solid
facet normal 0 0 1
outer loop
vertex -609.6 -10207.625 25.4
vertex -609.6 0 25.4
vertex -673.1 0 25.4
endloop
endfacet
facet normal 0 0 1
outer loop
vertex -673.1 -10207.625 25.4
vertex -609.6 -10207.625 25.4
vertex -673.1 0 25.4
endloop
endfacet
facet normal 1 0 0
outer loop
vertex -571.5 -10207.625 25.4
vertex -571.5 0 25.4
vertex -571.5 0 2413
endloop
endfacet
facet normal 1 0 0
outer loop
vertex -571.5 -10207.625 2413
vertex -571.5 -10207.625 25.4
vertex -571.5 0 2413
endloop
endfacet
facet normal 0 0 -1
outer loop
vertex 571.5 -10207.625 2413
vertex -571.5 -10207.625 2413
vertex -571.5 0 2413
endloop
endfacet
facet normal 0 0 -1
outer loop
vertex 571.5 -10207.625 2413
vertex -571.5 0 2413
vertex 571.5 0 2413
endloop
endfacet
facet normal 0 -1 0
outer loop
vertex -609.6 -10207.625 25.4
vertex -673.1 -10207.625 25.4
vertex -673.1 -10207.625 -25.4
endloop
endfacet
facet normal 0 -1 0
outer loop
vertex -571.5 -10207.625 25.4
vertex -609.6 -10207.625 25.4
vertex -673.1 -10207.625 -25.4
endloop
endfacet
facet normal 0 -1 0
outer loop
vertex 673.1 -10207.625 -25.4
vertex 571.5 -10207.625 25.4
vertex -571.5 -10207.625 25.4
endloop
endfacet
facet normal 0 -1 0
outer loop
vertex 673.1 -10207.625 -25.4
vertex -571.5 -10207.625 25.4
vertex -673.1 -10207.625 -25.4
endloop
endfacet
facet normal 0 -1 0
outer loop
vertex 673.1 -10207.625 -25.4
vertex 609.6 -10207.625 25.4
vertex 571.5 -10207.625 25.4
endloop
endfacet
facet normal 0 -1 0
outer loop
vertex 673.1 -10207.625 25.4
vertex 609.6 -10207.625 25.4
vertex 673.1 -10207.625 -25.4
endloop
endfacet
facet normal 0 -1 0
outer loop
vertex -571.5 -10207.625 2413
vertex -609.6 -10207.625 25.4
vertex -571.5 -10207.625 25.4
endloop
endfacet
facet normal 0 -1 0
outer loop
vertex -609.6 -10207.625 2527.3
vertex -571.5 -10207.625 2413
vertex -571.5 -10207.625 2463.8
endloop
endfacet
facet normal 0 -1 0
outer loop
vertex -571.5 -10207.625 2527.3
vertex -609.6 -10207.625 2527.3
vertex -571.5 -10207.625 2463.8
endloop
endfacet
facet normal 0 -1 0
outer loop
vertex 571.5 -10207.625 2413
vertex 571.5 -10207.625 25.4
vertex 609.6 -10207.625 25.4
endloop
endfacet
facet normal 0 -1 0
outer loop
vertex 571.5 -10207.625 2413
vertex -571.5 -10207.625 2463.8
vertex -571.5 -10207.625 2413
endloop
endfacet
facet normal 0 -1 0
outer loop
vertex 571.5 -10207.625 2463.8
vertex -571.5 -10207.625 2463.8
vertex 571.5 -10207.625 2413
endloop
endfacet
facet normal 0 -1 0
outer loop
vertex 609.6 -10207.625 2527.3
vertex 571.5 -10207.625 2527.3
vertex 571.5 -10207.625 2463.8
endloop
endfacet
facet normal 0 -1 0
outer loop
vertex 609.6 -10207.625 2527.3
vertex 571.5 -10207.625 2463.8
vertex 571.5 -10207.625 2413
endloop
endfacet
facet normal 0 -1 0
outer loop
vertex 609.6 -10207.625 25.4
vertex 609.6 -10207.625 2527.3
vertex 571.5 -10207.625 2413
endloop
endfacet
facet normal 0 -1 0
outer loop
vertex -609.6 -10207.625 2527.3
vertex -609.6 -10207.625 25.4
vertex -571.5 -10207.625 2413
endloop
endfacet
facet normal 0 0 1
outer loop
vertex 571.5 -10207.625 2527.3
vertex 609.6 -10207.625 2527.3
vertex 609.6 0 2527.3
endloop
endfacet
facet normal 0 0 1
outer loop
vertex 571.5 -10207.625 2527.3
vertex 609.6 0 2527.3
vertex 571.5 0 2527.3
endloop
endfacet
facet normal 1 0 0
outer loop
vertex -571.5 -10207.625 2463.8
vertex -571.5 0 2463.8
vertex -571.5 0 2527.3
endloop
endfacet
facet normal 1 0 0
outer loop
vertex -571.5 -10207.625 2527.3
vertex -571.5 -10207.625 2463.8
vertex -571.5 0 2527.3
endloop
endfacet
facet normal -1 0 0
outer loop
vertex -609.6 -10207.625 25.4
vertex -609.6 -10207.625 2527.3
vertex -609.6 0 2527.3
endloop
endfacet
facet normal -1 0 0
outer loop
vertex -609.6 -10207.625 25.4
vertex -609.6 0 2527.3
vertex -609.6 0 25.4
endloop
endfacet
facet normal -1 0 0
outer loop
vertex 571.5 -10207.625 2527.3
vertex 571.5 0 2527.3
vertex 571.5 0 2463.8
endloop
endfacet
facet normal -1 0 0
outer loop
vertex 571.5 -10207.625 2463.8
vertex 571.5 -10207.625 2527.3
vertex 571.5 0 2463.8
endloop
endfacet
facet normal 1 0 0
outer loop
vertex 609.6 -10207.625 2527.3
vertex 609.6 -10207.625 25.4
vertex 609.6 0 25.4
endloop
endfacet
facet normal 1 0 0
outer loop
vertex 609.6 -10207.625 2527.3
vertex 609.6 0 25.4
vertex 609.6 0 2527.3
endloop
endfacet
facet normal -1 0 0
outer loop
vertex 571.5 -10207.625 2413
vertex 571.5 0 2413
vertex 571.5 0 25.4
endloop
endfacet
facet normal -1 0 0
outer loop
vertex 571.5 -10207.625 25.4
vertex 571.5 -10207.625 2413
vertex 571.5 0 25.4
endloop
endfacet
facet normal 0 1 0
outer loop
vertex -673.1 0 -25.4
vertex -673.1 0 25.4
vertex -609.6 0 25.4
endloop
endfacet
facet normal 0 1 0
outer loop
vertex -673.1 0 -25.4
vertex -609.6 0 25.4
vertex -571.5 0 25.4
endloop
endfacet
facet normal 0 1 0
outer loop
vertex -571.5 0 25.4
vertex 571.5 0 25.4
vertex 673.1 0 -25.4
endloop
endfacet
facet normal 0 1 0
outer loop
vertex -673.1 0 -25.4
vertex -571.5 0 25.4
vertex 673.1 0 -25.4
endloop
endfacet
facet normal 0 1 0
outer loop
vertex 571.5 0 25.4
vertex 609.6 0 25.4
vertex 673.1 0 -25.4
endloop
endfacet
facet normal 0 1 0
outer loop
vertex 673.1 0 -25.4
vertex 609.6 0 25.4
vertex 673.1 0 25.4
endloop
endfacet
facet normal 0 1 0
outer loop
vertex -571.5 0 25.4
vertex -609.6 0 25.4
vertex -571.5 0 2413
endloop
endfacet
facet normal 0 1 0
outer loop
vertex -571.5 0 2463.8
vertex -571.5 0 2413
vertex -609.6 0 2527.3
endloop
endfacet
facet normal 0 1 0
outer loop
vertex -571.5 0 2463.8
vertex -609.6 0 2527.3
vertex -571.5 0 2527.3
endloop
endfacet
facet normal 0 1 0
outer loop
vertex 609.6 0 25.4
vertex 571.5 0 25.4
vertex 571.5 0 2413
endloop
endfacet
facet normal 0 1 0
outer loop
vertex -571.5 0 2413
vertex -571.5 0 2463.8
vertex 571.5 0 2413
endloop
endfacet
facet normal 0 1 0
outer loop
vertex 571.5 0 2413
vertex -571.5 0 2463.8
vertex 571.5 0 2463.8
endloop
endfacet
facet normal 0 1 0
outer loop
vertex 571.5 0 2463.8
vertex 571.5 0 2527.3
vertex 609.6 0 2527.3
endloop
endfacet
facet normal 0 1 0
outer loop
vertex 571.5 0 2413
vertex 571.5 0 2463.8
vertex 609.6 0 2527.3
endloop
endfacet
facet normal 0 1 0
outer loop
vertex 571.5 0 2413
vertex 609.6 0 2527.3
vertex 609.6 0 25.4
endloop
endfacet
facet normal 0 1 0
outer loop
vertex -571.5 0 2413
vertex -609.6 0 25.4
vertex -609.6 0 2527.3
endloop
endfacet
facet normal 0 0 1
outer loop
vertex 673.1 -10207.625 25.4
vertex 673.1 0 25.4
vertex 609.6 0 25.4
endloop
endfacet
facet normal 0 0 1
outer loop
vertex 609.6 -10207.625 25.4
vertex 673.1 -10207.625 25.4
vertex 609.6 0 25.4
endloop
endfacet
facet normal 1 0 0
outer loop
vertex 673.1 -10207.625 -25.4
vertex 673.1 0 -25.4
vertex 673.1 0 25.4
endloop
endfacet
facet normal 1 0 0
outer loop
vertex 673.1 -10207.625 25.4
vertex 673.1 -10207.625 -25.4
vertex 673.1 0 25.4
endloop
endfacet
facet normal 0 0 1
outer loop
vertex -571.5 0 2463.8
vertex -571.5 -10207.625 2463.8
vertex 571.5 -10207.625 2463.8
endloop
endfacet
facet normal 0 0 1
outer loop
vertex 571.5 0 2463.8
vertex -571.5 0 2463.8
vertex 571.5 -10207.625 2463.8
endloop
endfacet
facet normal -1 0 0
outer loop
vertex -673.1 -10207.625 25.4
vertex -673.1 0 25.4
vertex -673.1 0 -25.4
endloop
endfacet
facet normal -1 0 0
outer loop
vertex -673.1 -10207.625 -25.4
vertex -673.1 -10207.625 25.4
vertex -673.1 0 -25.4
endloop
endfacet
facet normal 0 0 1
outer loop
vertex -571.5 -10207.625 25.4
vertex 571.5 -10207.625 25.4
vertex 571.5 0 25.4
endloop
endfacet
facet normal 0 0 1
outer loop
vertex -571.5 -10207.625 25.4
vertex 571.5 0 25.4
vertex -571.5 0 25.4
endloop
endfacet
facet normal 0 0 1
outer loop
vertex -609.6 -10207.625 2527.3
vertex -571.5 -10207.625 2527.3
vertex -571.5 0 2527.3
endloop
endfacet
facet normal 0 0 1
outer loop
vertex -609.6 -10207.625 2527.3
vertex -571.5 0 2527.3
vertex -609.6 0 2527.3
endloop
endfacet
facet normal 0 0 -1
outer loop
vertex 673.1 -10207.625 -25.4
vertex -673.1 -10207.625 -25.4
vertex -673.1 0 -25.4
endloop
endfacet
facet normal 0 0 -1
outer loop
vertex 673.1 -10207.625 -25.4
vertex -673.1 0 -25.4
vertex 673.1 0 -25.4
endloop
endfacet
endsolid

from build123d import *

# Parameters (mm, degrees)
F0_W     = 1143
F0_H     = 50.8
F1_DEPTH = 10207.625


with BuildPart() as f1:
    # F0 (on Front) → F1 (new body)
    with BuildSketch(Plane.XZ):
        Polygon((-673.1, -25.4), (673.1, -25.4), (673.1, 25.4), (609.6, 25.4), (571.5, 25.4), (-571.5, 25.4), (-609.6, 25.4), (-673.1, 25.4), align=None)
        Polygon((571.5, 25.4), (609.6, 25.4), (609.6, 2527.3), (571.5, 2527.3), (571.5, 2463.8), (571.5, 2413), align=None)
        Polygon((-609.6, 2527.3), (-609.6, 25.4), (-571.5, 25.4), (-571.5, 2413), (-571.5, 2463.8), (-571.5, 2527.3), align=None)
        with Locations((0, 2438.4)):
            Rectangle(F0_W, F0_H)
    extrude(amount=F1_DEPTH)


solid = f1.part
